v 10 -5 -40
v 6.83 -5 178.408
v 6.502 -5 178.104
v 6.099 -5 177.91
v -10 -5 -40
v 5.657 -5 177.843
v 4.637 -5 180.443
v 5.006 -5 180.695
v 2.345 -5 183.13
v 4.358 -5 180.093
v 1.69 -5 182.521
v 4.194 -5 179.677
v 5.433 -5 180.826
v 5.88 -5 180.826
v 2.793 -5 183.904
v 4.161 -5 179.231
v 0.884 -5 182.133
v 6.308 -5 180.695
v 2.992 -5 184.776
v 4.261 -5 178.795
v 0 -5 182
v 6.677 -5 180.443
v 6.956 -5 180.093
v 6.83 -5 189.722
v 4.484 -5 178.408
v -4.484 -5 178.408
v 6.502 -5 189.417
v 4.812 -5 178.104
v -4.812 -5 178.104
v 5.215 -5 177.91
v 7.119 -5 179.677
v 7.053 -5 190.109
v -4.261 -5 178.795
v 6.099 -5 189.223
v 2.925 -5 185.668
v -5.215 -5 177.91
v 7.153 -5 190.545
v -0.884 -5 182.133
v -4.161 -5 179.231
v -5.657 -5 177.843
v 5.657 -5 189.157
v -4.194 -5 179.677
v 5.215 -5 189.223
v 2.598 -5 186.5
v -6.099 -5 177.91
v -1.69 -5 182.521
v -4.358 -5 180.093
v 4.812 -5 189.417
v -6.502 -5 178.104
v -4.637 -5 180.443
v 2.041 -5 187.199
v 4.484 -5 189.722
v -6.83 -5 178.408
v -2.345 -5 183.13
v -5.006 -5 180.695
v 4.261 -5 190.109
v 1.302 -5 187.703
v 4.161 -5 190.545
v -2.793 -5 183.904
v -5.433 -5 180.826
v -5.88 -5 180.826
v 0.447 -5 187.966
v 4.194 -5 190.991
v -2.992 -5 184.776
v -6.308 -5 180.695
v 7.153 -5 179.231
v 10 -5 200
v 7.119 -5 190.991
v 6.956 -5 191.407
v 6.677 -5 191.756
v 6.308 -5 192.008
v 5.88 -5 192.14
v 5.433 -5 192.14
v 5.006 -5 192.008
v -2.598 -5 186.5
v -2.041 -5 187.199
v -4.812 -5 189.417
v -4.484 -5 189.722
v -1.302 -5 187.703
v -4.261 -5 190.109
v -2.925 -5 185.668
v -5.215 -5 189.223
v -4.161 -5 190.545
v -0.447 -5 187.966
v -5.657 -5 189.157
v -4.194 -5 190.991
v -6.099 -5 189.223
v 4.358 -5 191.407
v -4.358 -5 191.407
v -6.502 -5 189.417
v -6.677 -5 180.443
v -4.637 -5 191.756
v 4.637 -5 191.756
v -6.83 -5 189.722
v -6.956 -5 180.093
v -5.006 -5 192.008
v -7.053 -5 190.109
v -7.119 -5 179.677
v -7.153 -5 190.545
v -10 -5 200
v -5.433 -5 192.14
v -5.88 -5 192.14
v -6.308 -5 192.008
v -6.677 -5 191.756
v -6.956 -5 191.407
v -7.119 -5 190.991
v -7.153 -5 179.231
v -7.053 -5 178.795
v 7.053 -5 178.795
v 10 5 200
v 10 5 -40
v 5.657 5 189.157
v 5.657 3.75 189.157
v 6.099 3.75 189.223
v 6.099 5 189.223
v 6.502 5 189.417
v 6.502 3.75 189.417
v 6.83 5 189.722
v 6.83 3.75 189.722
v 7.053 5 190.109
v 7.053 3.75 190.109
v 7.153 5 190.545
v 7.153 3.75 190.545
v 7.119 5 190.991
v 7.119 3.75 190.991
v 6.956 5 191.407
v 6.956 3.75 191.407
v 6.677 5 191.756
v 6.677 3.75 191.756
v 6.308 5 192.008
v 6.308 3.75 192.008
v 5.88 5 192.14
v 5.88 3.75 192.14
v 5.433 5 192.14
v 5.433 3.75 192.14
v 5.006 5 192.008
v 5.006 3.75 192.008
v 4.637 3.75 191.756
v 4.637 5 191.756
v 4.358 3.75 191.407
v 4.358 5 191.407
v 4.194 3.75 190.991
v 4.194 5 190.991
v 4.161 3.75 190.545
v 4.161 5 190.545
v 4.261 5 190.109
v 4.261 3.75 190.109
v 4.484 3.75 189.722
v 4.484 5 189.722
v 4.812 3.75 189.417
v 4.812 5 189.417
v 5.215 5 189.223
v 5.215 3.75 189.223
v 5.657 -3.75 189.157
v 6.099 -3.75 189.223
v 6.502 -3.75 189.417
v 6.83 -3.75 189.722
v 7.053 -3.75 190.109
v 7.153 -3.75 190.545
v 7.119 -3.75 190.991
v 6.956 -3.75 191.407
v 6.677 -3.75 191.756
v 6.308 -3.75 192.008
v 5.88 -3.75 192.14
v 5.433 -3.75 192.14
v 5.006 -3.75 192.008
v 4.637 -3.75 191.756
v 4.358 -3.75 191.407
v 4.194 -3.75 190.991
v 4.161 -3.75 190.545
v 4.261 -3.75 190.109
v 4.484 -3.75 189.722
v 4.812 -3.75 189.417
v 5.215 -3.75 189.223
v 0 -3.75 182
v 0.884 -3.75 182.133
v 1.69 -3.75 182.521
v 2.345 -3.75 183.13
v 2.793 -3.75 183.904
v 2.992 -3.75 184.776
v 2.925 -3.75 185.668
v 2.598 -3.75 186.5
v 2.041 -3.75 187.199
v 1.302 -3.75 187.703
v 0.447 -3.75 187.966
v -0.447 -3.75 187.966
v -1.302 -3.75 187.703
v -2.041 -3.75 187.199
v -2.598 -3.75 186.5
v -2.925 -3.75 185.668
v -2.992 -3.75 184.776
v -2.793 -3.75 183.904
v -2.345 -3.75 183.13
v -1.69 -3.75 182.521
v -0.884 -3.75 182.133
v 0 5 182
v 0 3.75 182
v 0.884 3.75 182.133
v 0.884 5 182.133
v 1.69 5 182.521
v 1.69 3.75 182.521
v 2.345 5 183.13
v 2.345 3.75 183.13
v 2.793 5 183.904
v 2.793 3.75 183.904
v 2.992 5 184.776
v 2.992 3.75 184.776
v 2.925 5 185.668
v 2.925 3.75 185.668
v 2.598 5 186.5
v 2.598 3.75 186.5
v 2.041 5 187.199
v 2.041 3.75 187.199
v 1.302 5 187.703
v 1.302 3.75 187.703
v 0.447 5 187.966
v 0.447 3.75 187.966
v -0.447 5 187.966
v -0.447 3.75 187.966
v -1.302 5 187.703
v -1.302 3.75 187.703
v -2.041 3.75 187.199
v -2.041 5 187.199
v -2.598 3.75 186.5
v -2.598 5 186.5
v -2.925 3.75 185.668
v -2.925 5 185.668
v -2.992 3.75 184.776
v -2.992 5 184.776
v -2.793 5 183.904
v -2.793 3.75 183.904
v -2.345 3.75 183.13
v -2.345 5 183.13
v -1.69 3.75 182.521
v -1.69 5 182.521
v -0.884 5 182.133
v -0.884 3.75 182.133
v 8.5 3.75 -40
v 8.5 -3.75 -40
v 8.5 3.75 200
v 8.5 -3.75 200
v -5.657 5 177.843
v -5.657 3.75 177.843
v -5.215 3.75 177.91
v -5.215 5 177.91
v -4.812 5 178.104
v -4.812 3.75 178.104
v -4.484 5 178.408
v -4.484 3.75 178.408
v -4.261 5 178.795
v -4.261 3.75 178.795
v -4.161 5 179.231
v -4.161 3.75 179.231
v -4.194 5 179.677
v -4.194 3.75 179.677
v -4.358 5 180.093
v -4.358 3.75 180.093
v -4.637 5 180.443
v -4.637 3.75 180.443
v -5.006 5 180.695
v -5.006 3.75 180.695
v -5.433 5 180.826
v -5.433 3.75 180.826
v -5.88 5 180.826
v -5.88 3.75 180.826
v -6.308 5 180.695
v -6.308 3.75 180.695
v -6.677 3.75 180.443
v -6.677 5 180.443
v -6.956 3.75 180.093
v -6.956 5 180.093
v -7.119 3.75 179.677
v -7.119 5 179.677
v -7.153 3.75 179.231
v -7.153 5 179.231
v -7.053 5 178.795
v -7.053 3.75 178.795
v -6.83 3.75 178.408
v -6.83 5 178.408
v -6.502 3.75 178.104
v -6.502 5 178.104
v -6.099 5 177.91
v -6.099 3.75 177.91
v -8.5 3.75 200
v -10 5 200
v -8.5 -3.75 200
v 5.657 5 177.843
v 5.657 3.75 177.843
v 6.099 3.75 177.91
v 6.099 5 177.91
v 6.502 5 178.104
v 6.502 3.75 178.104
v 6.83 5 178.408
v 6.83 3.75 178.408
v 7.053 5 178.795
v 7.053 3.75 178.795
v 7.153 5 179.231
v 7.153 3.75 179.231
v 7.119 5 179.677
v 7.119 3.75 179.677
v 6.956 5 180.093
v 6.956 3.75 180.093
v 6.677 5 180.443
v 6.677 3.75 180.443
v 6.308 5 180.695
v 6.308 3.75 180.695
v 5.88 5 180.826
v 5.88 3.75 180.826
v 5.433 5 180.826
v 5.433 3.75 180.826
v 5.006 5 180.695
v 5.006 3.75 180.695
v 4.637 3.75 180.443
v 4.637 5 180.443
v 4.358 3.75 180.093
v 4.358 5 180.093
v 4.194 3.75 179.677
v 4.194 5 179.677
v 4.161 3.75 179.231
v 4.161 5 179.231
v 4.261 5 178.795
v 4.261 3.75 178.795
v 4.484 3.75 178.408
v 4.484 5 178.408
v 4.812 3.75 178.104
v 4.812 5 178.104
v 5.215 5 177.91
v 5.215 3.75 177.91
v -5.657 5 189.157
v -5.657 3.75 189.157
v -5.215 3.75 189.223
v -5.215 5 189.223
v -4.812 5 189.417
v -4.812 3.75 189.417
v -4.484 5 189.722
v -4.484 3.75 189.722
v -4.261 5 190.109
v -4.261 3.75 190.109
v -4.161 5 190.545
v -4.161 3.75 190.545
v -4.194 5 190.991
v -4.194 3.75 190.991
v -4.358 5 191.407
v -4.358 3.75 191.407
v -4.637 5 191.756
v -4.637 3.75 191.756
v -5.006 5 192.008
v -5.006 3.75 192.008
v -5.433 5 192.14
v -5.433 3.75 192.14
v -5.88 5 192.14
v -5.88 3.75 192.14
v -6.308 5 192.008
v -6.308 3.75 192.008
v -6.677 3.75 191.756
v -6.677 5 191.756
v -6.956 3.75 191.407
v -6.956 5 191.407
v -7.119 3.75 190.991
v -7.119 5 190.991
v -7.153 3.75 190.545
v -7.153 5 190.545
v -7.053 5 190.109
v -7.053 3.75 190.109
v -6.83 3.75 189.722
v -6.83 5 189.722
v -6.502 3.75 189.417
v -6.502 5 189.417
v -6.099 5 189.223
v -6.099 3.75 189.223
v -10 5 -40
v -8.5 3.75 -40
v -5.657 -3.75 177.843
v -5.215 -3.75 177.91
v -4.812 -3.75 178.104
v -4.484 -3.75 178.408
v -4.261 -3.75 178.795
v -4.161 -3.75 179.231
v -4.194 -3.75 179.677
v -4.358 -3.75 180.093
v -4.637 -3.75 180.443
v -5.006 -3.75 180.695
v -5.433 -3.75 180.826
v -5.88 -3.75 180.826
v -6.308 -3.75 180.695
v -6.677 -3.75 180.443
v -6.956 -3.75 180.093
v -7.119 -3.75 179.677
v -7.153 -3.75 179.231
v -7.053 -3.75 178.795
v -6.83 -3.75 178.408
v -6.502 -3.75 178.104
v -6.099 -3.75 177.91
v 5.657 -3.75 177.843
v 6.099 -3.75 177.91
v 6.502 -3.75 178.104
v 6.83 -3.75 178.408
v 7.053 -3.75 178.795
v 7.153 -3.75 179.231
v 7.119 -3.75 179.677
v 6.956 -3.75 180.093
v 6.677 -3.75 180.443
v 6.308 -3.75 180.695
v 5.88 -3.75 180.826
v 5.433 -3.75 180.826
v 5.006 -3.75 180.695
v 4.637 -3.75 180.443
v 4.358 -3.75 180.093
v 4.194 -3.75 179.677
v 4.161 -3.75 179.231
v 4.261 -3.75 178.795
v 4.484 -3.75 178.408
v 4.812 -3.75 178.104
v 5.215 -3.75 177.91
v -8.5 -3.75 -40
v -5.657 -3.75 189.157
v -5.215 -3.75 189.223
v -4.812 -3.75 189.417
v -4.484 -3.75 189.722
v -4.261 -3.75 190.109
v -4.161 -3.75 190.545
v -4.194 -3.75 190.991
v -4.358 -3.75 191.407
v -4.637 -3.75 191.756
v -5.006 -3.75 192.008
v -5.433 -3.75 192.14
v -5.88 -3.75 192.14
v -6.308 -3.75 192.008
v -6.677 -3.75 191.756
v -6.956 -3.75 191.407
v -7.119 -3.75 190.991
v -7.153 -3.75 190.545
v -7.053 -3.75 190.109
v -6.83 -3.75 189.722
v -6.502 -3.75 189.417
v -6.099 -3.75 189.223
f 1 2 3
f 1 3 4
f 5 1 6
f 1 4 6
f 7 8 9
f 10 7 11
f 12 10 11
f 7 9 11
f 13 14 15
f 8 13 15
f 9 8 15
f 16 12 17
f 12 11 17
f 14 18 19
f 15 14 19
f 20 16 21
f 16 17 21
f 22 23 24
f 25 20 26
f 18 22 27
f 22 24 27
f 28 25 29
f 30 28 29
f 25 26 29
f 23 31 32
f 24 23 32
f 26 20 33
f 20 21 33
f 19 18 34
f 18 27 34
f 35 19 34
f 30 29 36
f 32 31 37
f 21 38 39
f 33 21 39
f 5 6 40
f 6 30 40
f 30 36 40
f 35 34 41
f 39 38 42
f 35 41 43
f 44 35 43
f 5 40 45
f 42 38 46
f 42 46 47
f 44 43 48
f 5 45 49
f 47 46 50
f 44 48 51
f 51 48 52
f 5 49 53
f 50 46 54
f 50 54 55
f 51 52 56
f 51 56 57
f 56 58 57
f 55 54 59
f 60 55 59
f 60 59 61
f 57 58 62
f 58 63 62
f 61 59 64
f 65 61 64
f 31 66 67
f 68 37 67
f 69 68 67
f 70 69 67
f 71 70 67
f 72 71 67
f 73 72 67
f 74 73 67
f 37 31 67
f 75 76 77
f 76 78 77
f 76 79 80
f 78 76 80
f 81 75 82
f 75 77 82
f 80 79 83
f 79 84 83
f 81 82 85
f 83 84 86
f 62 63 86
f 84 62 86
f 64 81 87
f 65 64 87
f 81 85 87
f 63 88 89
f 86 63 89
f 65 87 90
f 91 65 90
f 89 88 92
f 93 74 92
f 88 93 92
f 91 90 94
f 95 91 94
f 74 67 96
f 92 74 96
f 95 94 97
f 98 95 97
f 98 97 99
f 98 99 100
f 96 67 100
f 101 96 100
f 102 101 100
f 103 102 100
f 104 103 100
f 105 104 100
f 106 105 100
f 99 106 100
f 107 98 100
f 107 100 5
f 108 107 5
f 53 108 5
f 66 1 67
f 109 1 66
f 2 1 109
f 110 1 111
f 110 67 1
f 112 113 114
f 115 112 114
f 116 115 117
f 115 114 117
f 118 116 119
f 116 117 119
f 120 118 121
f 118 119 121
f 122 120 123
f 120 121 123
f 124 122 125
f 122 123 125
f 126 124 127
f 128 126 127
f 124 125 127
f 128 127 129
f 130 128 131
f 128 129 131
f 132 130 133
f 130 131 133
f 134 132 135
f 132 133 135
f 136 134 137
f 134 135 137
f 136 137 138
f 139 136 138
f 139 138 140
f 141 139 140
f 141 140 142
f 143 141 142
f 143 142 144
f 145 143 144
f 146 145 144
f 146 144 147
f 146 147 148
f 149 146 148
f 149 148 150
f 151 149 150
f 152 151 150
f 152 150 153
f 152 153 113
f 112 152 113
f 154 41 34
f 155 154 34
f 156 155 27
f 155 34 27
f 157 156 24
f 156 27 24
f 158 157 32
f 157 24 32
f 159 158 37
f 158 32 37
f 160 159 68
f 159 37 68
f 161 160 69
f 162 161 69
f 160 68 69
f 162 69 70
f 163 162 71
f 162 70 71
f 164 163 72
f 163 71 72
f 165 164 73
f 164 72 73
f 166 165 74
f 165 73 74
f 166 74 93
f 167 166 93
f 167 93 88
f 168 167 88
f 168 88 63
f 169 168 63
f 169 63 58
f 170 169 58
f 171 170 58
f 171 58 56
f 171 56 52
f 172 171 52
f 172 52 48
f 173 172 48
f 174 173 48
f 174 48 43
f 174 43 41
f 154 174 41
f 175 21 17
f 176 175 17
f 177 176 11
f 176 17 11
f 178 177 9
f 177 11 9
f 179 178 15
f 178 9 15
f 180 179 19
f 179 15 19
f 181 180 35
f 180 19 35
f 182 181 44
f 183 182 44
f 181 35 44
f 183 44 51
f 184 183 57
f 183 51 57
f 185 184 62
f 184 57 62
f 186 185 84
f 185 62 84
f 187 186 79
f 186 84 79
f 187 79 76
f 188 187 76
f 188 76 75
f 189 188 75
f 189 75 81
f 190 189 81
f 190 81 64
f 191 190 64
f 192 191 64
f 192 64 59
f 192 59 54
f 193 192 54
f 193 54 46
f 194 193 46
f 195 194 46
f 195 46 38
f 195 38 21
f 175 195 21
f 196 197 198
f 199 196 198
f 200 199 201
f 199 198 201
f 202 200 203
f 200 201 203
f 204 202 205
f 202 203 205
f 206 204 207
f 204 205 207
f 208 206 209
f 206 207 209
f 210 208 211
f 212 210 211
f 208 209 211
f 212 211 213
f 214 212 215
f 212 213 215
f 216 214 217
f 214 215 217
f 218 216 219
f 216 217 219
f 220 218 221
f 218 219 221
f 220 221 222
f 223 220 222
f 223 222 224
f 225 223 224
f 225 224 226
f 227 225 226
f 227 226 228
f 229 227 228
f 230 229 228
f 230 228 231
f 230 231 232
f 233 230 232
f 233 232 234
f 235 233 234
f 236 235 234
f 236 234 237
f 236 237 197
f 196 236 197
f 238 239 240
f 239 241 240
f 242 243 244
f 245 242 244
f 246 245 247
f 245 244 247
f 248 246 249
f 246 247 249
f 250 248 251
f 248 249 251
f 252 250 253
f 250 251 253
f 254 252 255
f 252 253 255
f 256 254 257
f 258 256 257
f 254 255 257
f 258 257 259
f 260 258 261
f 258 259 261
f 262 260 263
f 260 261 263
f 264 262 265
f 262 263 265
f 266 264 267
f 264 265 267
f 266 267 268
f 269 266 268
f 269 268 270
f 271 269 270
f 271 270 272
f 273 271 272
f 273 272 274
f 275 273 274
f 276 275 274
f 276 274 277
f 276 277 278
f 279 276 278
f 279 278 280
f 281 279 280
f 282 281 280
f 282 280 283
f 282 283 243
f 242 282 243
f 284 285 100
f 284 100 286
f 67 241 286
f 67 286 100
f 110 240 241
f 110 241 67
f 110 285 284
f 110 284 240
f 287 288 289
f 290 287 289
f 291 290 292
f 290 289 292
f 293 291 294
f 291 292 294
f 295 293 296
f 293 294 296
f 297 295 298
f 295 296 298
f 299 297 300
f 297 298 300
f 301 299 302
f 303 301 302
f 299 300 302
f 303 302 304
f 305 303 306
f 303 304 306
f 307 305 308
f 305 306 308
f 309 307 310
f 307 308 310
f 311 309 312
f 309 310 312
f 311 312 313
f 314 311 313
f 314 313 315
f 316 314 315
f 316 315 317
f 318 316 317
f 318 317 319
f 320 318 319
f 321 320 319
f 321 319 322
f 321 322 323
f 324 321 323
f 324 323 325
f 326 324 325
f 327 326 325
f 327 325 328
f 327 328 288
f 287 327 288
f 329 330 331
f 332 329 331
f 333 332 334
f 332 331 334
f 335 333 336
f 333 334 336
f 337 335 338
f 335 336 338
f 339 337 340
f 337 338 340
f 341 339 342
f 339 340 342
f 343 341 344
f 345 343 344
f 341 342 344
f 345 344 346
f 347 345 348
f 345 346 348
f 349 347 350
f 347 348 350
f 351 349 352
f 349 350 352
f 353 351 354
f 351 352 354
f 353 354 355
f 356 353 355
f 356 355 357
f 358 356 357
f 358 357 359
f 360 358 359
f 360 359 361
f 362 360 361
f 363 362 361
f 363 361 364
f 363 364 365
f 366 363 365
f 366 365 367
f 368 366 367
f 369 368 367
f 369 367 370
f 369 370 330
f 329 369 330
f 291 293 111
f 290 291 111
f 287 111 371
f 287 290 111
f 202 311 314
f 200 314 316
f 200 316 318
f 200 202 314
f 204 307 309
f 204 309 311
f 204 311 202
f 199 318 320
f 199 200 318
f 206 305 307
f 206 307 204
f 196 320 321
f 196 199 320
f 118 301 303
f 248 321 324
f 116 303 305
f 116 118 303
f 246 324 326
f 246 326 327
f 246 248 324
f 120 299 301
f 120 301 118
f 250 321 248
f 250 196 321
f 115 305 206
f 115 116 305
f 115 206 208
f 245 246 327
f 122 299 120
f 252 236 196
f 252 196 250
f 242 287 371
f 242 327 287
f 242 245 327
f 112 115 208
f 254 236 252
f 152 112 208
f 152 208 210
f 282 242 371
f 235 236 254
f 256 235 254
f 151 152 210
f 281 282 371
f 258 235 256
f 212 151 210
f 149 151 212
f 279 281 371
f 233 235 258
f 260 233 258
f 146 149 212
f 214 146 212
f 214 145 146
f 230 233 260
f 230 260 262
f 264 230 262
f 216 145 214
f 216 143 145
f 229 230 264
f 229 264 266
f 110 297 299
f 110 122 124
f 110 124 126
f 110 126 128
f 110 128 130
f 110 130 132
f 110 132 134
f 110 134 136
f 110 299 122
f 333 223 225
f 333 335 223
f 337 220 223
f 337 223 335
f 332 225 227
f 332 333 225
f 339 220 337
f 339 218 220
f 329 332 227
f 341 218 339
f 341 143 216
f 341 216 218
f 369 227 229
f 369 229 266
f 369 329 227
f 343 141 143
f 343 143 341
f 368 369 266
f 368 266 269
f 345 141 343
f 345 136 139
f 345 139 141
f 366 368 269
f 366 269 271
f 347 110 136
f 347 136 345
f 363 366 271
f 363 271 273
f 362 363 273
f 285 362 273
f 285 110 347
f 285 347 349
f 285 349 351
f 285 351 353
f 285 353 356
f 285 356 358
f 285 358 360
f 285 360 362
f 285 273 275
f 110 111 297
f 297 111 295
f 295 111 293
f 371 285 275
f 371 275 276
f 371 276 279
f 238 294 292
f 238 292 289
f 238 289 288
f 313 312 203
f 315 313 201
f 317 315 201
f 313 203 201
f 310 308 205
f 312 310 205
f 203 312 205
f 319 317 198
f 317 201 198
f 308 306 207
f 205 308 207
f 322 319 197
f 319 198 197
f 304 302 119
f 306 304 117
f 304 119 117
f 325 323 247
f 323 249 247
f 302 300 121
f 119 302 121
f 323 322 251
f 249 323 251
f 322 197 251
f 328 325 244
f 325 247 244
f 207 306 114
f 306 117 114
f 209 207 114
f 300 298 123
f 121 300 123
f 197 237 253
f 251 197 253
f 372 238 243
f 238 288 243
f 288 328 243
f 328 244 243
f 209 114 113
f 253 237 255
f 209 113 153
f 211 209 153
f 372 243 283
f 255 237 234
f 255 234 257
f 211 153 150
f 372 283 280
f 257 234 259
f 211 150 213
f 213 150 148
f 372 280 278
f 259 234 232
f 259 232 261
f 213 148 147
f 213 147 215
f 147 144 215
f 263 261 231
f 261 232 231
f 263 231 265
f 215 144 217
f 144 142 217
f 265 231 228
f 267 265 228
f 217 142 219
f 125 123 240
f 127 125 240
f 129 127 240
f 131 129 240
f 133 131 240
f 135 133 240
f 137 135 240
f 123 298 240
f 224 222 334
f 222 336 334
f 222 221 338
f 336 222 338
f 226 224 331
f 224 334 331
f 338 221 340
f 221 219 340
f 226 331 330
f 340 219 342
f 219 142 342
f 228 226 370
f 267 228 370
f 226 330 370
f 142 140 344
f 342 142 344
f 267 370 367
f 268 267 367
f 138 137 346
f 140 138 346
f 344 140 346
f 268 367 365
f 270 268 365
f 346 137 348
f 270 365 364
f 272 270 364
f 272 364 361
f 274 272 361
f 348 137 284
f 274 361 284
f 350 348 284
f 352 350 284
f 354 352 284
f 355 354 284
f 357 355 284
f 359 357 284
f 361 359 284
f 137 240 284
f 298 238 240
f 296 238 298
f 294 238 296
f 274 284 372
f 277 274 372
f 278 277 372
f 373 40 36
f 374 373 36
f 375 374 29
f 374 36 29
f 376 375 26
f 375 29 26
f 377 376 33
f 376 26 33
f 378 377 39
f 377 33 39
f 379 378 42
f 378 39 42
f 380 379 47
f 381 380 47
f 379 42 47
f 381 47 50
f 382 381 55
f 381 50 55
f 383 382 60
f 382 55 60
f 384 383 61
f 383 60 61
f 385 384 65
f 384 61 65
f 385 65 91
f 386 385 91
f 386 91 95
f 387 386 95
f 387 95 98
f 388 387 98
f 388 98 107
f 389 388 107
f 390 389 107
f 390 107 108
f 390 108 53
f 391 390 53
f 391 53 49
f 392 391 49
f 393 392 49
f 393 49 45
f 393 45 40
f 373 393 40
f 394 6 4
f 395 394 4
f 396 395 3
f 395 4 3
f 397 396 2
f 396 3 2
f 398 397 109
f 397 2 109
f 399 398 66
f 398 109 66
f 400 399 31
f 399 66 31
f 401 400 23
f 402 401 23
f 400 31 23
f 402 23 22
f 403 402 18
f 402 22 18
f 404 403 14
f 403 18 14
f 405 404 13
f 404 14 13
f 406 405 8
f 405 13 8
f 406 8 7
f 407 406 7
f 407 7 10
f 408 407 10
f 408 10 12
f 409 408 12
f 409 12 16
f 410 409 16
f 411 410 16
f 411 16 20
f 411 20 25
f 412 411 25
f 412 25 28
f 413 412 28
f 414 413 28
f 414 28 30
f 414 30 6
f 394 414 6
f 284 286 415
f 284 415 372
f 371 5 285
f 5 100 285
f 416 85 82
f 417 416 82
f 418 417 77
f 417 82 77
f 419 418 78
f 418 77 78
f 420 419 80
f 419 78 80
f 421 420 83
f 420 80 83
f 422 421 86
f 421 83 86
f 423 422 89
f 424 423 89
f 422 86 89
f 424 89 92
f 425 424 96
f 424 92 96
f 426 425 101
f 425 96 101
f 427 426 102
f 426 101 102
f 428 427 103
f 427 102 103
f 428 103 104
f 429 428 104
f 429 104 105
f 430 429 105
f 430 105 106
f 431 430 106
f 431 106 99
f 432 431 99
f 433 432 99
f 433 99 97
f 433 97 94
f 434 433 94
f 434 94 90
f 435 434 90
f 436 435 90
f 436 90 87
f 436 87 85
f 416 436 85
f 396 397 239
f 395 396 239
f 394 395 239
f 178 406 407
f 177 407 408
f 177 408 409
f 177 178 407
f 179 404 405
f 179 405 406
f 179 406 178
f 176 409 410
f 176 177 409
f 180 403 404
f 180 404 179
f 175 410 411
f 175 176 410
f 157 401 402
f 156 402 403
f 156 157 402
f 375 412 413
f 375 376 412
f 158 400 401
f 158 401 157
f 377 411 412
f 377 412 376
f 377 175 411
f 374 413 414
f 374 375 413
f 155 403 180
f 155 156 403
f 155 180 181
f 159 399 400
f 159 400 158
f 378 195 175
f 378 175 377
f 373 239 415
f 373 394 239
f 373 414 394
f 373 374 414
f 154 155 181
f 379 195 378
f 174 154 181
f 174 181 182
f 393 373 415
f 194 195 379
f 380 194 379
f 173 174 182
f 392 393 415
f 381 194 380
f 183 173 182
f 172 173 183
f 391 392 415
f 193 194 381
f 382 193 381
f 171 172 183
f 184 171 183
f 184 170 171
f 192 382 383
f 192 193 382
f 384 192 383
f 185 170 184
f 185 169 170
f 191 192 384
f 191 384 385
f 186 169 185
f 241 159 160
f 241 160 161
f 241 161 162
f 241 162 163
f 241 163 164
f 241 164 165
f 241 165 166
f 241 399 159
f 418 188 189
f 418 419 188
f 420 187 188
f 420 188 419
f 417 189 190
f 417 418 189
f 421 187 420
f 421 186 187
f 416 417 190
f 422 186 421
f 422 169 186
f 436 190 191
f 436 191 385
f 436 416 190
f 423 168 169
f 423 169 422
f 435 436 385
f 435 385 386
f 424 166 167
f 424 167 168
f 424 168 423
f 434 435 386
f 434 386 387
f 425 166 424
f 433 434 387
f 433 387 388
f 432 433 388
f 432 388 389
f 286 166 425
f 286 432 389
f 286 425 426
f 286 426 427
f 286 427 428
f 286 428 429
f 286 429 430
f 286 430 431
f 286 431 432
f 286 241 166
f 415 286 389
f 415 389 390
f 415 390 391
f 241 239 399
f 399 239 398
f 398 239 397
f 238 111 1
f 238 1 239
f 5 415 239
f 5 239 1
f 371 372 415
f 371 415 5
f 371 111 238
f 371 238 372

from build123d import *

# Parameters (mm, degrees)
SKETCH_1_W          = 20
SKETCH_1_H          = 10
SKETCH_1_W_2        = 17
SKETCH_1_H_2        = 7.5
EXTRUDE_1_DEPTH     = 200
SKETCH_3_R          = 3
CUT_EXTRUDE_2_DEPTH = 10
SKETCH_5_R          = 1.5
CUT_EXTRUDE_4_DEPTH = 10
SKETCH_6_W          = 20
SKETCH_6_H          = 10
SKETCH_6_W_2        = 17
SKETCH_6_H_2        = 7.5
EXTRUDE_2_DEPTH     = 40


with BuildPart() as part:
    # 草图1 → 凸台-拉伸1 (new body)
    with BuildSketch(Plane.XY):
        Rectangle(SKETCH_1_W, SKETCH_1_H)
        Rectangle(SKETCH_1_W_2, SKETCH_1_H_2, mode=Mode.SUBTRACT)
    extrude(amount=EXTRUDE_1_DEPTH)

    # 草图3 → 切除-拉伸2 (cut)
    with BuildSketch(Plane.XZ.offset(5)):
        with Locations(Location((0, 185, 0), (0, 0, 270))):
            Circle(SKETCH_3_R)
    extrude(amount=-CUT_EXTRUDE_2_DEPTH, mode=Mode.SUBTRACT)

    # 草图5 → 切除-拉伸4 (cut)
    with BuildSketch(Plane.XZ.offset(5)):
        with Locations(Location((5.656854249, 190.656854249, 0), (0, 0, 270))):
            Circle(SKETCH_5_R)
        with Locations(Location((5.656854249, 179.343145751, 0), (0, 0, 270))):
            Circle(SKETCH_5_R)
        with Locations(Location((-5.656854249, 179.343145751, 0), (0, 0, 270))):
            Circle(SKETCH_5_R)
        with Locations(Location((-5.656854249, 190.656854249, 0), (0, 0, 270))):
            Circle(SKETCH_5_R)
    extrude(amount=-CUT_EXTRUDE_4_DEPTH, mode=Mode.SUBTRACT)

    # 草图6 → 凸台-拉伸2 (add)
    with BuildSketch(Plane(origin=(0, 0, 0), x_dir=(-1, 0, 0), z_dir=(0, 0, -1))):
        Rectangle(SKETCH_6_W, SKETCH_6_H)
        Rectangle(SKETCH_6_W_2, SKETCH_6_H_2, mode=Mode.SUBTRACT)
    extrude(amount=EXTRUDE_2_DEPTH)


solid = part.part
